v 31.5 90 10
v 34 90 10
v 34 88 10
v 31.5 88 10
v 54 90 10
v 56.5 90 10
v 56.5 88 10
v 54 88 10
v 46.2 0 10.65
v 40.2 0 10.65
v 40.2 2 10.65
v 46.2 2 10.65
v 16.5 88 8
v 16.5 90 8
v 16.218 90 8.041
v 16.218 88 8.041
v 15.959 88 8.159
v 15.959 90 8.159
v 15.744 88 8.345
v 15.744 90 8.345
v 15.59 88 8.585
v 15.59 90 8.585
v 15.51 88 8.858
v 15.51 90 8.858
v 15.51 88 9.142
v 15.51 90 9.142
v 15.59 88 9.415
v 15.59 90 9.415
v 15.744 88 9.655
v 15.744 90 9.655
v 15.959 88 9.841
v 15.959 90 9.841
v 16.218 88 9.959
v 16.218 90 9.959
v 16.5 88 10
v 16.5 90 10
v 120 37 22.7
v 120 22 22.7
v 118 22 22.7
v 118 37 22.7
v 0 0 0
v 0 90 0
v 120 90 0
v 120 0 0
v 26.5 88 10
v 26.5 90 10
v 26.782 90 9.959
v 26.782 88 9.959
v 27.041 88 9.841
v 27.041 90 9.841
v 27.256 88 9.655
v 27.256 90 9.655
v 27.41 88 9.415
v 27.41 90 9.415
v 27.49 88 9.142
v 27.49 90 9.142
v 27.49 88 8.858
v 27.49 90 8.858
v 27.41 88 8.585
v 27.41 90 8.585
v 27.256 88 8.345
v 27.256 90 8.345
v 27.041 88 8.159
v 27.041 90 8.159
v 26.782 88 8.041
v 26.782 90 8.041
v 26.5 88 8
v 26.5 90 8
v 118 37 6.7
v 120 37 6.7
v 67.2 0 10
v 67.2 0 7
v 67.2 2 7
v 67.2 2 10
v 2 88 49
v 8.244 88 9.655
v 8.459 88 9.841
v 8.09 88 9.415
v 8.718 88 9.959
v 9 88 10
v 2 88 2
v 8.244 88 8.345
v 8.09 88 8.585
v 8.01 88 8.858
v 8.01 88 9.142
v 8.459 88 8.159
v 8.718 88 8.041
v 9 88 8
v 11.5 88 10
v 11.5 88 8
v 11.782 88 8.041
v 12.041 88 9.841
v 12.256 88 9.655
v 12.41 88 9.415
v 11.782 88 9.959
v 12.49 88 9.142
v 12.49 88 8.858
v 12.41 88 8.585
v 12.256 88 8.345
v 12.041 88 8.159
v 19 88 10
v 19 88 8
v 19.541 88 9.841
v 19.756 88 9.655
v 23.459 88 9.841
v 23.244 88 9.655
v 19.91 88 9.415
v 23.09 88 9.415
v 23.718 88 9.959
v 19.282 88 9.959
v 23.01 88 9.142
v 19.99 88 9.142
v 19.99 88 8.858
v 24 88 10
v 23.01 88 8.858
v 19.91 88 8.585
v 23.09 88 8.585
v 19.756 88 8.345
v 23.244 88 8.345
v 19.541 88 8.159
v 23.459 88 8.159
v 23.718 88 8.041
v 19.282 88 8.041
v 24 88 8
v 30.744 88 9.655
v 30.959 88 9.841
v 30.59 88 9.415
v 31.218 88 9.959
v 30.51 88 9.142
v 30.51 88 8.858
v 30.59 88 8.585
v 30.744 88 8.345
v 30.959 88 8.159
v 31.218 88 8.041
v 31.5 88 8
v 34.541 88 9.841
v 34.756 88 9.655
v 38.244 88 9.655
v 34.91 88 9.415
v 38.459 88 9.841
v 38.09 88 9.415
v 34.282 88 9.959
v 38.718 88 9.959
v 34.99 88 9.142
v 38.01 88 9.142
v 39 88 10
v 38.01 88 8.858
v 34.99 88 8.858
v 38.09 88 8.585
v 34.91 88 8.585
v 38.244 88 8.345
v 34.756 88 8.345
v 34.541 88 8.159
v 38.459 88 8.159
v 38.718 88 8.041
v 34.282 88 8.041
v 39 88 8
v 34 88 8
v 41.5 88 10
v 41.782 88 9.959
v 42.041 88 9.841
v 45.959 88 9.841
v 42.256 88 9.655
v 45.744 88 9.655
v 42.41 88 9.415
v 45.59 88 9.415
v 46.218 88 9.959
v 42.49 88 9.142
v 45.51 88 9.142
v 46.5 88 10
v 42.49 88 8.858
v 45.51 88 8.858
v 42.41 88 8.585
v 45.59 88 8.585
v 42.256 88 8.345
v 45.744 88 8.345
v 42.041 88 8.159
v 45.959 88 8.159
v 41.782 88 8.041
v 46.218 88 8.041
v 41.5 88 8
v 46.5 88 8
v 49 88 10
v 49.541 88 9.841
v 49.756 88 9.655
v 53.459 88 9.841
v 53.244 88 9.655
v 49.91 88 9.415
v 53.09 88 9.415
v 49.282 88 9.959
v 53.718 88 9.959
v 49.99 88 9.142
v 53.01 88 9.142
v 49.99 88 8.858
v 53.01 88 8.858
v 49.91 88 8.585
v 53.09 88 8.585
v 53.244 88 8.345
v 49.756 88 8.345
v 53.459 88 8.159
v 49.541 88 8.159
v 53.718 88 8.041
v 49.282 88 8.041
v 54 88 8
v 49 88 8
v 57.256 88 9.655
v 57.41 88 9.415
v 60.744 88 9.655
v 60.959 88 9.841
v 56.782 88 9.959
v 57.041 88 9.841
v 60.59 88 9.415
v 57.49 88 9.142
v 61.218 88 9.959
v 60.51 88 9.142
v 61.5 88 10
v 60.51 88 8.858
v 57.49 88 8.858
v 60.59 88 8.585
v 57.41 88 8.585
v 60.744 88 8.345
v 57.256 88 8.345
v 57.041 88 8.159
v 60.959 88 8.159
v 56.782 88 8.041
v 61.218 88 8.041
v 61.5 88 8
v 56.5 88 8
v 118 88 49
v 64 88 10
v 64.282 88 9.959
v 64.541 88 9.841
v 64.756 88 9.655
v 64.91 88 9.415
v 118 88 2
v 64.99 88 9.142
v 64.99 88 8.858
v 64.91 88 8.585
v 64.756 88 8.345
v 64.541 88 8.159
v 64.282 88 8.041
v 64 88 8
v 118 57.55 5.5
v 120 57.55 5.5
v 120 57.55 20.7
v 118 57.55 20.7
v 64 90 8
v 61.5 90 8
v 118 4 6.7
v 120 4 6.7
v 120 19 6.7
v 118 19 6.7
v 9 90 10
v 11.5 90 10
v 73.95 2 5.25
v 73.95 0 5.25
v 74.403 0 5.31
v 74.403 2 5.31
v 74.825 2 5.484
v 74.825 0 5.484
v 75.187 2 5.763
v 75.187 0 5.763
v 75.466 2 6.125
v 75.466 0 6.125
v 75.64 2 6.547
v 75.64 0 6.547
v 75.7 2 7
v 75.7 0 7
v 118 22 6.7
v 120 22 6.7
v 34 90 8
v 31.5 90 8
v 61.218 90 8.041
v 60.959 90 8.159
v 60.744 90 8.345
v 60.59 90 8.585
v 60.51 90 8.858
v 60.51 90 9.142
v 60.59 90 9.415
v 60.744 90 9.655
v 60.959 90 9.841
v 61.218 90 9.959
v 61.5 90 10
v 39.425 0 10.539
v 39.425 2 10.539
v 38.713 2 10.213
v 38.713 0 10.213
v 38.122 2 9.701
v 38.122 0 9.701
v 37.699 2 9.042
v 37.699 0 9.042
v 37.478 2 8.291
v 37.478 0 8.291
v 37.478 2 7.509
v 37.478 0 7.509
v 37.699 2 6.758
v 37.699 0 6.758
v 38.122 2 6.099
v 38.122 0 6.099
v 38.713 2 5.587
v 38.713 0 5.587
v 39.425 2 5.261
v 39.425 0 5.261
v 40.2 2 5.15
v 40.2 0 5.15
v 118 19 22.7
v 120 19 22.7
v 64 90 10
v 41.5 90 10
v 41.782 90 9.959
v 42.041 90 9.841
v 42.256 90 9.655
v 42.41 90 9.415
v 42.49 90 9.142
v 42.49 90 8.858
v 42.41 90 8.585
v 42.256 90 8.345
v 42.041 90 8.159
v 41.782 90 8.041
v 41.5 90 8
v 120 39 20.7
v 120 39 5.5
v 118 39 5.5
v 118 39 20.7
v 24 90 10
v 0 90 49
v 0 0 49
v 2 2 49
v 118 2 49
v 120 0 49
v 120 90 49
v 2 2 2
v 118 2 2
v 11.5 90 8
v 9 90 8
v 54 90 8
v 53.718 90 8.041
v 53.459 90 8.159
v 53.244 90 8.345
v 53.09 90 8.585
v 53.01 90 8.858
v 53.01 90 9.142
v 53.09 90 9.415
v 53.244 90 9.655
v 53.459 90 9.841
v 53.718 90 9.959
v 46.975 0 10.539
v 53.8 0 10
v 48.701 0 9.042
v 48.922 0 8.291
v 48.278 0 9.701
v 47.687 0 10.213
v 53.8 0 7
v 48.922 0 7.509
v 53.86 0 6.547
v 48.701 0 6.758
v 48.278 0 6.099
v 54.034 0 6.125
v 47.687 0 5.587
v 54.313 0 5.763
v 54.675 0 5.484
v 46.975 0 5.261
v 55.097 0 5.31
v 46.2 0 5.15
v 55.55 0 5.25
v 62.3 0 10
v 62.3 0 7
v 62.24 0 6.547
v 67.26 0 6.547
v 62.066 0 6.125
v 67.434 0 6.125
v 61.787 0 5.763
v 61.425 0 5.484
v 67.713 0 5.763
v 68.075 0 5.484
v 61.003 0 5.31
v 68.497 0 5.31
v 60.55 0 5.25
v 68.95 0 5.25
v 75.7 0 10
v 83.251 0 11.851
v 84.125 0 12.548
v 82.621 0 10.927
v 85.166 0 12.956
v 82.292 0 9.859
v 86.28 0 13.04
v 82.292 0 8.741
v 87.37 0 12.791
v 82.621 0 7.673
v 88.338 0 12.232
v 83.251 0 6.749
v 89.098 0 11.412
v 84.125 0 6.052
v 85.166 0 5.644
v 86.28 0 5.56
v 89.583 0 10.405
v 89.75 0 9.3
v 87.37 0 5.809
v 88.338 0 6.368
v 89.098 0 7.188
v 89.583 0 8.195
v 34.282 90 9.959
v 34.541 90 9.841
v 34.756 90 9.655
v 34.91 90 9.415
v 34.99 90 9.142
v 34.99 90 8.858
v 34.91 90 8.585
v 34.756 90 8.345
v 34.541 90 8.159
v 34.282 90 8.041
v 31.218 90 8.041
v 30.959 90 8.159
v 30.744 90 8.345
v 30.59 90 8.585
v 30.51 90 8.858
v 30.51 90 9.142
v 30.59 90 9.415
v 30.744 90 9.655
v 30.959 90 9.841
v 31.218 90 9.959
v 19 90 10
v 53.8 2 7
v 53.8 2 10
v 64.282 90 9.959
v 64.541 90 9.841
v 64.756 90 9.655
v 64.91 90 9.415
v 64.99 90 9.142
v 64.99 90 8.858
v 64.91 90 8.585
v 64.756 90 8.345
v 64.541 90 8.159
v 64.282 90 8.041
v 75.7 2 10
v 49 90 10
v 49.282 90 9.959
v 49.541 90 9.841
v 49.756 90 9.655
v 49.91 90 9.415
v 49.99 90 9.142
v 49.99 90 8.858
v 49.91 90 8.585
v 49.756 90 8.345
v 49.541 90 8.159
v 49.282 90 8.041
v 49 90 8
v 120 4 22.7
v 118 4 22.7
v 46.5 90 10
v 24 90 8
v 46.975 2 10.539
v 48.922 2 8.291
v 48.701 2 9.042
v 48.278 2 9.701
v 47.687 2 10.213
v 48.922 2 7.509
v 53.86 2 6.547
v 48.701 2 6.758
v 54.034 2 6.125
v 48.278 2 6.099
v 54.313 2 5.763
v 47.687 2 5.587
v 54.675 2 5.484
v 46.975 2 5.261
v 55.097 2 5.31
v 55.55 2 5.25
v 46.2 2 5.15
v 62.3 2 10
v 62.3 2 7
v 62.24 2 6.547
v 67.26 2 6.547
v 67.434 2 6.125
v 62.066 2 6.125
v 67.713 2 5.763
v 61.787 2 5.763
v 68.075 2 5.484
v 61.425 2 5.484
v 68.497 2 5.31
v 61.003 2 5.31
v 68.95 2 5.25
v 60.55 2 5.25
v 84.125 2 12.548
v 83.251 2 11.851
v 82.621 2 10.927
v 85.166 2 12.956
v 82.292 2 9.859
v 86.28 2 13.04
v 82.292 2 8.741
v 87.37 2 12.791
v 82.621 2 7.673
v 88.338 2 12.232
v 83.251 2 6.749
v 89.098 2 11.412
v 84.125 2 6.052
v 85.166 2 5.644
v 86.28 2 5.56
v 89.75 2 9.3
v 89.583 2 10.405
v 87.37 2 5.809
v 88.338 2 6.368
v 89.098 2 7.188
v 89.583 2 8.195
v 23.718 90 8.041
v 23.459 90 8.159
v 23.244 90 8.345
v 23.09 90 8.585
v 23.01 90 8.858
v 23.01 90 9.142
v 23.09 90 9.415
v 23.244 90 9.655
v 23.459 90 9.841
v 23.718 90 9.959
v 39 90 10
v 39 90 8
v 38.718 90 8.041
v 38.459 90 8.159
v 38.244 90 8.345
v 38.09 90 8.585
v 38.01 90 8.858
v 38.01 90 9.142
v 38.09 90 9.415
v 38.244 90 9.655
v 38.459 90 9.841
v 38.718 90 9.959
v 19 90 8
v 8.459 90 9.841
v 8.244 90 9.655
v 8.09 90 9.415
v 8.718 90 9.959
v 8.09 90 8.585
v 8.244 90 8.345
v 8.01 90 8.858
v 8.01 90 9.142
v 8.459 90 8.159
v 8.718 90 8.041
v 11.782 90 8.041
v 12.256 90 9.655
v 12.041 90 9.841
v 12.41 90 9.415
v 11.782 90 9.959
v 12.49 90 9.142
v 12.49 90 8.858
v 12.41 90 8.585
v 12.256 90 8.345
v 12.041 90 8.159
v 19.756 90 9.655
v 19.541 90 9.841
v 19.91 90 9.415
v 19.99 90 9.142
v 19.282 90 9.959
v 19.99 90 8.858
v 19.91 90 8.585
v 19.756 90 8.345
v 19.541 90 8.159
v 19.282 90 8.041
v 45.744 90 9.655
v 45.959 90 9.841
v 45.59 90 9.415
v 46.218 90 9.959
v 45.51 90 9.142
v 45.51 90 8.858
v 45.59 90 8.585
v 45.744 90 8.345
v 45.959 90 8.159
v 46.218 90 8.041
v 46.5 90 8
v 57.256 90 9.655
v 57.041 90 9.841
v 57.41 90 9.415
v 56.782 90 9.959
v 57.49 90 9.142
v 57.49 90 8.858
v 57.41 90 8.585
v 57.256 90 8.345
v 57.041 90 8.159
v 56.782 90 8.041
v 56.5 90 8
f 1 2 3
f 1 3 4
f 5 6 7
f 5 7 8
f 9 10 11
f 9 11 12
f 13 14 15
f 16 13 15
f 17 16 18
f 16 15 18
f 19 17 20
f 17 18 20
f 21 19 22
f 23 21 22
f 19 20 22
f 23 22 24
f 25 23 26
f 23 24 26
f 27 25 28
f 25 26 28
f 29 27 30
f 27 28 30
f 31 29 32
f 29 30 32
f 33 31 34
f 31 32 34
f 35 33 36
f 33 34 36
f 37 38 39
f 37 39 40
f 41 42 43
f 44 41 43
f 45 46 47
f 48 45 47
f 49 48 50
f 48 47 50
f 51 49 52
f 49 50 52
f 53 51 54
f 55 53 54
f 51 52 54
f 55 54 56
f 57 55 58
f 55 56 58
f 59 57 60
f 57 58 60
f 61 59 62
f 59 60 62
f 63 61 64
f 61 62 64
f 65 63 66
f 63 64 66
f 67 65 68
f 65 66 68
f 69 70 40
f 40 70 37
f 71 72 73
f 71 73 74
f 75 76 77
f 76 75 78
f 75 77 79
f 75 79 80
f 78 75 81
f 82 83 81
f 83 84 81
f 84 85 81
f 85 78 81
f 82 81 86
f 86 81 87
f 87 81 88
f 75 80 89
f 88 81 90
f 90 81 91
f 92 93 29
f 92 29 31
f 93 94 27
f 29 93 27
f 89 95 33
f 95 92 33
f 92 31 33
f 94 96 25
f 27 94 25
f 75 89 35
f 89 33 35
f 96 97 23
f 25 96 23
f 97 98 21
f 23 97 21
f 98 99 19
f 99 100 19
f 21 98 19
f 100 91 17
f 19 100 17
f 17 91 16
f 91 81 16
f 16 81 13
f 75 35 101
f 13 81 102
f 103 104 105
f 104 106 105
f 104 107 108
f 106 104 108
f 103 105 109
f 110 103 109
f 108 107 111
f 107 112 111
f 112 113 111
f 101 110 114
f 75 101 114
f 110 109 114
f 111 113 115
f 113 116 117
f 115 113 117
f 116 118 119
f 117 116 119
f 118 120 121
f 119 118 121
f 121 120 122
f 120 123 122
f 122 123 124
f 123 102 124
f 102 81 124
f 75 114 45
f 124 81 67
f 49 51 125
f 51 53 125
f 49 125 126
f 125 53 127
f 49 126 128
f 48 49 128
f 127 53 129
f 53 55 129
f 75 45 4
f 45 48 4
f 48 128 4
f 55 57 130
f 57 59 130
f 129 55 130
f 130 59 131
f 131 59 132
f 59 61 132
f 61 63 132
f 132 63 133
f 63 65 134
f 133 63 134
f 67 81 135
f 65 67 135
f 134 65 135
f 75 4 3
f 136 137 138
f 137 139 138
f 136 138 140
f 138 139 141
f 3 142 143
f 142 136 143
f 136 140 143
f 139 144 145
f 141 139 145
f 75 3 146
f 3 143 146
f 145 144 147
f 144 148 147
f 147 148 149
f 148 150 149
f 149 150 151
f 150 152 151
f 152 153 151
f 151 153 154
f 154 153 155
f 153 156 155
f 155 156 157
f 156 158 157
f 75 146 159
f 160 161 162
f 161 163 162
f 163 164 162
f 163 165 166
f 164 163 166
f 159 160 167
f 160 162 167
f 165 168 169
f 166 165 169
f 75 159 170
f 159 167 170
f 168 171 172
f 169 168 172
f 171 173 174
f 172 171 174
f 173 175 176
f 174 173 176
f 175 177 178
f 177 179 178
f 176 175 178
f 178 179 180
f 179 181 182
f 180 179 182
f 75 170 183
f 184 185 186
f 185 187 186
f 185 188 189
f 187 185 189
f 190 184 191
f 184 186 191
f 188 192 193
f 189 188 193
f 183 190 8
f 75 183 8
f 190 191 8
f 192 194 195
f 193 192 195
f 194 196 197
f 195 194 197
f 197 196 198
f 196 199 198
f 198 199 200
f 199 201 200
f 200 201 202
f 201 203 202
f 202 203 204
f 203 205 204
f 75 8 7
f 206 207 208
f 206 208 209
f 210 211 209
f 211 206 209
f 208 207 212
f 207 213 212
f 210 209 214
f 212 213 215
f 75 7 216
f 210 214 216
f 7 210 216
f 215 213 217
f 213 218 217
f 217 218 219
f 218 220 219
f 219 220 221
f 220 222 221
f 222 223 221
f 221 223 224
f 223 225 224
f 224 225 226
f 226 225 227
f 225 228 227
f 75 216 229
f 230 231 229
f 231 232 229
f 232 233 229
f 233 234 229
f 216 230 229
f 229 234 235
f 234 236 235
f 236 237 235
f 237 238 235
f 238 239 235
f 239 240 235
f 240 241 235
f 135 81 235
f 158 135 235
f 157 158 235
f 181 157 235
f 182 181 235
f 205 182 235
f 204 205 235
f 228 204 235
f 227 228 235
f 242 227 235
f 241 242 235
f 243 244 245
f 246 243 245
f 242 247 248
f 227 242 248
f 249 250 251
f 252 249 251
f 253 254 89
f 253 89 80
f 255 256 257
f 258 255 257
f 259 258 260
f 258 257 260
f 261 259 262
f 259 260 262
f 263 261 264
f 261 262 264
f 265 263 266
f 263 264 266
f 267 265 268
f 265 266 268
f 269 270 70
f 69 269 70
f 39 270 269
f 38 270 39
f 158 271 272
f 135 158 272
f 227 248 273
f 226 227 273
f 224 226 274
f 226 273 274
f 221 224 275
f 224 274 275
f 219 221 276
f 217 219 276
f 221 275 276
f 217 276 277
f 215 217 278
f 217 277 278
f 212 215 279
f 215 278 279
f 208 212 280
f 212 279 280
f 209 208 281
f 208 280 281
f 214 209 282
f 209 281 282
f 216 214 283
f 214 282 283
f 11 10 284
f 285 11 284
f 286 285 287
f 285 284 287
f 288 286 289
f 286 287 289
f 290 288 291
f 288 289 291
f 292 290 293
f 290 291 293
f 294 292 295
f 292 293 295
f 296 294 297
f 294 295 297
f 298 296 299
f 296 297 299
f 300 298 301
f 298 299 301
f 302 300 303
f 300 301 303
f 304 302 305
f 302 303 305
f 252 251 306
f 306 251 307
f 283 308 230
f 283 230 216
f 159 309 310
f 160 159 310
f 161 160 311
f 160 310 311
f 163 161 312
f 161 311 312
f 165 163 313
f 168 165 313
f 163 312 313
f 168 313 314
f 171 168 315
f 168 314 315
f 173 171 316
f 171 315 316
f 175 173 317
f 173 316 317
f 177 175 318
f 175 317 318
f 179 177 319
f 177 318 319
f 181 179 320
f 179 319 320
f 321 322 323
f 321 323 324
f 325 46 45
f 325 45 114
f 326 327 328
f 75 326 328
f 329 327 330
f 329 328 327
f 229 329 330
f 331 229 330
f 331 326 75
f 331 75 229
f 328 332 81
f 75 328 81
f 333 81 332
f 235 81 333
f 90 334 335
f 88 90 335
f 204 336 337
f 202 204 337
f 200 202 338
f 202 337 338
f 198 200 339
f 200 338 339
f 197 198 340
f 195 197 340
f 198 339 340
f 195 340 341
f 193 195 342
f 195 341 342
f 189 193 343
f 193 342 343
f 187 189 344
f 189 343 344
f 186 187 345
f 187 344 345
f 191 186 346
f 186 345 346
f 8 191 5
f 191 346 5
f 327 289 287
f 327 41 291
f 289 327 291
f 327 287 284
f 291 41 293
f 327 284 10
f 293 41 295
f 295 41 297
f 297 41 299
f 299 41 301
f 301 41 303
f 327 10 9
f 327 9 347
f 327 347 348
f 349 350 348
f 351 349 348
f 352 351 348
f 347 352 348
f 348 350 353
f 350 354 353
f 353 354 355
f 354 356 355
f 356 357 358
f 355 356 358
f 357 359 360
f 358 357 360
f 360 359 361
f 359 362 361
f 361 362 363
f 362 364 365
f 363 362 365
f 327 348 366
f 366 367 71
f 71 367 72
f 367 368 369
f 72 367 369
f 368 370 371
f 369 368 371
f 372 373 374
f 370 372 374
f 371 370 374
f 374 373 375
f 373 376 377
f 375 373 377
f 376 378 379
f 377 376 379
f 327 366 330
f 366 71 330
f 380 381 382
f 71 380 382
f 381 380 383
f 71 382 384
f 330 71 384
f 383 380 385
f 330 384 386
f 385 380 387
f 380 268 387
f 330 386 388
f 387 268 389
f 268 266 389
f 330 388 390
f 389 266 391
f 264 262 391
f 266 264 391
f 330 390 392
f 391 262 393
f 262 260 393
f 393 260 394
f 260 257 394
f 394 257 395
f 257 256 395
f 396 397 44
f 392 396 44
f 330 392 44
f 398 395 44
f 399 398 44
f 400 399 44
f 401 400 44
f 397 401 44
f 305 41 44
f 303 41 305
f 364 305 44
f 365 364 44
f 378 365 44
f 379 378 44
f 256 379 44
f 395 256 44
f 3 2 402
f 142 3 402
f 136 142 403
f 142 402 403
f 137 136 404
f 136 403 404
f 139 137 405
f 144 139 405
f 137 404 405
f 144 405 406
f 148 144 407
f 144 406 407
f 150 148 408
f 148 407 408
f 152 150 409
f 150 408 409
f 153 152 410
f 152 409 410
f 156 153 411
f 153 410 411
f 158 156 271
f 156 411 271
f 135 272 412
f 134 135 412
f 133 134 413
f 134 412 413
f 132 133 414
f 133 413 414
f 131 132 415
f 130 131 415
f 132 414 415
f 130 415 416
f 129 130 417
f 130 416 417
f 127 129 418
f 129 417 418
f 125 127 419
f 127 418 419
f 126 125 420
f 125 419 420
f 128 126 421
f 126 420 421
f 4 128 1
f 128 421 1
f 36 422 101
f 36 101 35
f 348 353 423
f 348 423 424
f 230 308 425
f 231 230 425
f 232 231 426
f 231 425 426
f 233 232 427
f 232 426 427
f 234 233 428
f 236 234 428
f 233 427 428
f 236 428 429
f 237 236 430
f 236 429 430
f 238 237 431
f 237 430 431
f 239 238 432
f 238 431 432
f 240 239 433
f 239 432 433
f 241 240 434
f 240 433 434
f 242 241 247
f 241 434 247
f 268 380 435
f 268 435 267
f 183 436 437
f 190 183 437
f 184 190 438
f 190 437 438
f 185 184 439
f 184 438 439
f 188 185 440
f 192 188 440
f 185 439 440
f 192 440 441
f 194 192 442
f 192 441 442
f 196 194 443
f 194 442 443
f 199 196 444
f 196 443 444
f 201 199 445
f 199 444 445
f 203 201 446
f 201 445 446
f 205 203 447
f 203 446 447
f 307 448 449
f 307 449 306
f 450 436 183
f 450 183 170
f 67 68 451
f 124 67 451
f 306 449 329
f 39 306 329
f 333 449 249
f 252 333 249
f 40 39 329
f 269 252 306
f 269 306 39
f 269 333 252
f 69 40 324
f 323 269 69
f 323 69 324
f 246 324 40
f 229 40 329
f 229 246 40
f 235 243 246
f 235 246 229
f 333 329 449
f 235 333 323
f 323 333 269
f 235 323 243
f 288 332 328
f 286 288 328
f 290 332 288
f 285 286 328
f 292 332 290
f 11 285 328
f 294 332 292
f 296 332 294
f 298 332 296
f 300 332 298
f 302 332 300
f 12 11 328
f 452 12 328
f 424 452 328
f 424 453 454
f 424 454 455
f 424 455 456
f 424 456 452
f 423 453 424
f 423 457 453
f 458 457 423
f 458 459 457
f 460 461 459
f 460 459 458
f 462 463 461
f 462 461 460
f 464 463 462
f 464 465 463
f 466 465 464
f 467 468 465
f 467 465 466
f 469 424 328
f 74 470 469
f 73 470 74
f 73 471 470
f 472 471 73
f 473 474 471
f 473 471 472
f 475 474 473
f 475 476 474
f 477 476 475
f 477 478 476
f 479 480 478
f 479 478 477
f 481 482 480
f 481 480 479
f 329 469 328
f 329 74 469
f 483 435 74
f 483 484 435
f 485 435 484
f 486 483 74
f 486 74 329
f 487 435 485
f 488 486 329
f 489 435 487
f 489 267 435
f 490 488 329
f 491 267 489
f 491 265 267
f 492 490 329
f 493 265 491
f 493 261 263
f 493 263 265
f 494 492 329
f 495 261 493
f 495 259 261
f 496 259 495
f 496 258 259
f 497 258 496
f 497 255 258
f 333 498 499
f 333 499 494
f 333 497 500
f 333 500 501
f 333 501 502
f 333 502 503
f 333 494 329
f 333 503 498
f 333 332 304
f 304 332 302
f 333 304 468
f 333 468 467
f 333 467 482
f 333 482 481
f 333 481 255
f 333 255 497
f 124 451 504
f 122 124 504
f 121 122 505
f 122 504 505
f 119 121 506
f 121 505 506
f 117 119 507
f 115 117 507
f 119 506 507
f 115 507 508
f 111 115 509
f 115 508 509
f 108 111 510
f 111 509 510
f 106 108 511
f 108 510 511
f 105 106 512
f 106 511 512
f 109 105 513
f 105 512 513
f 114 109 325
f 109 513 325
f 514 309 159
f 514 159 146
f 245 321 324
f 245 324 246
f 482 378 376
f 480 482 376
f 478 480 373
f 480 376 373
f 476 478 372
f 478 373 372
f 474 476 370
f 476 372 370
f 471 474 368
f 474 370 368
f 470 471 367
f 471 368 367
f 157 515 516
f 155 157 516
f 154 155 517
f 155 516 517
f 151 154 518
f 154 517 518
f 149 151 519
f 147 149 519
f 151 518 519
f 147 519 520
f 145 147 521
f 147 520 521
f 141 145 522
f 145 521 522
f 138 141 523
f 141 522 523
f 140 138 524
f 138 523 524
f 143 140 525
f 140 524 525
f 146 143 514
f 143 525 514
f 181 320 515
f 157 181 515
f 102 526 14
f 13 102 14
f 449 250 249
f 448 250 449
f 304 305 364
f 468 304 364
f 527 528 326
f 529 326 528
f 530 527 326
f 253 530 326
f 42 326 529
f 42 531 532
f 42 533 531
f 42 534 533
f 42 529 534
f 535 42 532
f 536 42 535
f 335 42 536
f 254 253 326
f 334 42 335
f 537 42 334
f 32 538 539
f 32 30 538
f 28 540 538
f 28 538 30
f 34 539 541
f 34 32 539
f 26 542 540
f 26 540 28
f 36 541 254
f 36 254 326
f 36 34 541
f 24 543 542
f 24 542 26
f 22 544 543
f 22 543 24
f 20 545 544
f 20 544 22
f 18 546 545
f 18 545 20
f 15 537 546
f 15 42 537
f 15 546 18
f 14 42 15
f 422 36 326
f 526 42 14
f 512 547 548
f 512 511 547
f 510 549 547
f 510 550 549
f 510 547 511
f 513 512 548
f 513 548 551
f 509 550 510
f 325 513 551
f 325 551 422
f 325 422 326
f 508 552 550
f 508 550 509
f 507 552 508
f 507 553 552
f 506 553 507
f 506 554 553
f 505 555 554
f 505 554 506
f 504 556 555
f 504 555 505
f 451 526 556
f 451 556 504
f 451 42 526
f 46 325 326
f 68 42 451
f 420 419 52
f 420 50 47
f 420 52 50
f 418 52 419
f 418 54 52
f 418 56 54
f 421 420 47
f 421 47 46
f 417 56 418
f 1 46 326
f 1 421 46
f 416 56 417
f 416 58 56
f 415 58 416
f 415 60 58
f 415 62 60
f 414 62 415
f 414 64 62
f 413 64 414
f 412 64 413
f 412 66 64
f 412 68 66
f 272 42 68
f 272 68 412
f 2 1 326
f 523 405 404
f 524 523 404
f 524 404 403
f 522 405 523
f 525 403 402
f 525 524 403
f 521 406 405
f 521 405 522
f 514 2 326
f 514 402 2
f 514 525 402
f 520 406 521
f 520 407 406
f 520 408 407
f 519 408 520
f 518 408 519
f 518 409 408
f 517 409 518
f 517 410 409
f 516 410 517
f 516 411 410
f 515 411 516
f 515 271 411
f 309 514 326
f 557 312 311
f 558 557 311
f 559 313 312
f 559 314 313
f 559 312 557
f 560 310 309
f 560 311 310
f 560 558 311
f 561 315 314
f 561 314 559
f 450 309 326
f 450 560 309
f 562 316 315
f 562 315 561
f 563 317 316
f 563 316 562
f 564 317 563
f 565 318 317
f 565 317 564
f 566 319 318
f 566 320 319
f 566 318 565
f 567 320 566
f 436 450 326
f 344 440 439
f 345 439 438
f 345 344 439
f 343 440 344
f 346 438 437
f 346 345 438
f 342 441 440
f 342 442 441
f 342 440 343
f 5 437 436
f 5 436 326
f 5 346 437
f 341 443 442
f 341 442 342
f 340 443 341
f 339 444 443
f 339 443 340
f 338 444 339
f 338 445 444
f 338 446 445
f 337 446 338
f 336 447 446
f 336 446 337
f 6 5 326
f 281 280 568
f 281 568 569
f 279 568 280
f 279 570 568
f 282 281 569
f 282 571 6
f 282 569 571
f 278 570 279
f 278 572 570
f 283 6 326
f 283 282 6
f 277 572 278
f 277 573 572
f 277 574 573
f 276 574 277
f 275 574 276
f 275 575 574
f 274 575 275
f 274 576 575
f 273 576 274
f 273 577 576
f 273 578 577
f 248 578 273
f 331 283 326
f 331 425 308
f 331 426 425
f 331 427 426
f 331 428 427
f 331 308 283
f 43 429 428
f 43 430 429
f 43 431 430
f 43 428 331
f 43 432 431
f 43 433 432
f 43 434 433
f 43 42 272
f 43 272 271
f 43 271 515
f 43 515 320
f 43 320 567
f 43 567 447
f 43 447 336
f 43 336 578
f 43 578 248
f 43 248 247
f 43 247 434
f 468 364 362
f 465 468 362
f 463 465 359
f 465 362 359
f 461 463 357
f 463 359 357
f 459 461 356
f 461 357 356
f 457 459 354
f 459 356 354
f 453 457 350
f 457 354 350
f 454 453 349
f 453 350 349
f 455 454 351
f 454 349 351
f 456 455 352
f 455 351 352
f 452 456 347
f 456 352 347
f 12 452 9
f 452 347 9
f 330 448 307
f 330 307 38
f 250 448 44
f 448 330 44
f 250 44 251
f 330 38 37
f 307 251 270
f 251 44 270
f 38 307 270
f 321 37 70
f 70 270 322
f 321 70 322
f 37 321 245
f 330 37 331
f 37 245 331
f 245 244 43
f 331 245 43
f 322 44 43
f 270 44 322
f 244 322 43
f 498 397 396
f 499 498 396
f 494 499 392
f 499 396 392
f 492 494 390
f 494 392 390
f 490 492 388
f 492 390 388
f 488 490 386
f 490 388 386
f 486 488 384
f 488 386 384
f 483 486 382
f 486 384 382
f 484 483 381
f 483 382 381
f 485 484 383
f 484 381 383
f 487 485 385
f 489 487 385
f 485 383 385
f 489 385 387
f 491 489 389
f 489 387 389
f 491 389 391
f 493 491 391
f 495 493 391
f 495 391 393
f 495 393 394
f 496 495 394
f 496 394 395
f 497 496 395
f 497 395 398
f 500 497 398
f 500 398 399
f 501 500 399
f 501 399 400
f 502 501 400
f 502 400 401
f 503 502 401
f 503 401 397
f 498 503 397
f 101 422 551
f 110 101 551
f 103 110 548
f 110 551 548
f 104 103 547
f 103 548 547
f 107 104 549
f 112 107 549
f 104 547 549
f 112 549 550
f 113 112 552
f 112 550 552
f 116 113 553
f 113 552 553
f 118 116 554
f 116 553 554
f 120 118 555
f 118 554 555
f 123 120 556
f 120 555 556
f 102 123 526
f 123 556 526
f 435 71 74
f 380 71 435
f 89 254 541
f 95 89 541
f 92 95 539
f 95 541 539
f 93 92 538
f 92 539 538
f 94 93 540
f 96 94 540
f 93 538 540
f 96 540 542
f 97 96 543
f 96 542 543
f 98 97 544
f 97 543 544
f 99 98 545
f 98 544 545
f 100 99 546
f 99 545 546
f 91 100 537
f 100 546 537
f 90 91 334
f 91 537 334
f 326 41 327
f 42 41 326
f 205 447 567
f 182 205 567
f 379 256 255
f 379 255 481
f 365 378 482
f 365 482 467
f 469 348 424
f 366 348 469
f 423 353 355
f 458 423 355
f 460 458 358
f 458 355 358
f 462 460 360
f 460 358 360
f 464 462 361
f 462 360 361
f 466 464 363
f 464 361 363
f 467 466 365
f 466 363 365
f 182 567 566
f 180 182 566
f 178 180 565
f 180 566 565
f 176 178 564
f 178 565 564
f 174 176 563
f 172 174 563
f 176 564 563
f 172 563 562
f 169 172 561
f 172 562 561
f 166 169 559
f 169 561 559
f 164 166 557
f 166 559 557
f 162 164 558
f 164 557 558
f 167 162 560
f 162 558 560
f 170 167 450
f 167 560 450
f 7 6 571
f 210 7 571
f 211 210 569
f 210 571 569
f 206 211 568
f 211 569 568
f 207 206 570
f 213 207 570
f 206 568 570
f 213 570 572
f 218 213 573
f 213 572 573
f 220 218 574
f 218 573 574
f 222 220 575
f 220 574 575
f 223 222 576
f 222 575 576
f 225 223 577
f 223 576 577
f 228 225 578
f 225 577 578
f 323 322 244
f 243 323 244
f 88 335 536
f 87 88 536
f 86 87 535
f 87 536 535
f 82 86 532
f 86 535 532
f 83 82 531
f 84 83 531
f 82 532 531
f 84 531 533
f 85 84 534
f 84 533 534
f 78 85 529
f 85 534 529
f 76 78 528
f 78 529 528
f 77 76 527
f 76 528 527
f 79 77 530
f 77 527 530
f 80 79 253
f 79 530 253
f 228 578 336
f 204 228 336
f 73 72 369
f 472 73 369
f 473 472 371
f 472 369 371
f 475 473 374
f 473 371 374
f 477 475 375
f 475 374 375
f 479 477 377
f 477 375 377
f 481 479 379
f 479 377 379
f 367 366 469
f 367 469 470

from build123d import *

# Parameters (mm, degrees)
SKETCH001_W     = 120
SKETCH001_H     = 90
PAD_DEPTH       = 2
SKETCH_W        = 120
SKETCH_H        = 90
SKETCH_W_2      = 116
SKETCH_H_2      = 86
PAD001_DEPTH    = 47
SKETCH002_W     = 15
SKETCH002_H     = 16
SKETCH002_W_2   = 18.55
SKETCH002_H_2   = 15.2
POCKET_DEPTH    = 5
SKETCH003_R     = 3.75
POCKET001_DEPTH = 5
POCKET002_DEPTH = 5


with BuildPart() as part:
    # Sketch001 → Pad (new body)
    with BuildSketch(Plane.XY):
        with Locations((60, 45)):
            Rectangle(SKETCH001_W, SKETCH001_H)
    extrude(amount=PAD_DEPTH)

    # Sketch (on Face6 of Pad) → Pad001 (join)
    with BuildSketch(Plane.XY.offset(2)):
        with Locations((60, 45)):
            Rectangle(SKETCH_W, SKETCH_H)
        with Locations((60, 45)):
            Rectangle(SKETCH_W_2, SKETCH_H_2, mode=Mode.SUBTRACT)
    extrude(amount=PAD001_DEPTH)

    # Sketch002 (on Face8 of Pad001) → Pocket (cut)
    with BuildSketch(Plane.YZ.offset(120)):
        with Locations((11.5, 14.7)):
            Rectangle(SKETCH002_W, SKETCH002_H)
        with Locations((29.5, 14.7)):
            Rectangle(SKETCH002_W, SKETCH002_H)
        with Locations((48.275, 13.1)):
            Rectangle(SKETCH002_W_2, SKETCH002_H_2)
    extrude(amount=-POCKET_DEPTH, mode=Mode.SUBTRACT)

    # Sketch003 (on Face5 of Pocket) → Pocket001 (cut)
    with BuildSketch(Plane.XZ):
        with Locations((86, 9.3)):
            Circle(SKETCH003_R)
        with BuildLine():
            ThreePointArc((40.2, 10.65), (37.45, 7.9), (40.2, 5.15))
            Line((40.2, 5.15), (46.2, 5.15))
            ThreePointArc((46.2, 5.15), (48.95, 7.9), (46.2, 10.65))
            Line((40.2, 10.65), (46.2, 10.65))
        make_face()
        with BuildLine():
            Line((53.8, 10), (62.3, 10))
            Line((62.3, 10), (62.3, 7))
            ThreePointArc((60.55, 5.25), (61.787437, 5.762563), (62.3, 7))
            Line((60.55, 5.25), (55.55, 5.25))
            ThreePointArc((53.8, 7), (54.312563, 5.762563), (55.55, 5.25))
            Line((53.8, 7), (53.8, 10))
        make_face()
        with BuildLine():
            Line((67.2, 10), (75.7, 10))
            Line((75.7, 10), (75.7, 7))
            ThreePointArc((73.95, 5.25), (75.187437, 5.762563), (75.7, 7))
            Line((73.95, 5.25), (68.95, 5.25))
            ThreePointArc((67.2, 7), (67.712563, 5.762563), (68.95, 5.25))
            Line((67.2, 7), (67.2, 10))
        make_face()
    extrude(amount=-POCKET001_DEPTH, mode=Mode.SUBTRACT)

    # Sketch007 (on Face27 of Pocket001) → Pocket002 (cut)
    with BuildSketch(Plane(origin=(0, 90, 0), x_dir=(-1, 0, 0), z_dir=(0, 1, 0))):
        with BuildLine():
            ThreePointArc((-64, 10), (-65, 9), (-64, 8))
            Line((-64, 8), (-61.5, 8))
            ThreePointArc((-61.5, 8), (-60.5, 9), (-61.5, 10))
            Line((-64, 10), (-61.5, 10))
        make_face()
        with BuildLine():
            ThreePointArc((-56.5, 10), (-57.5, 9), (-56.5, 8))
            Line((-56.5, 8), (-54, 8))
            ThreePointArc((-54, 8), (-53, 9), (-54, 10))
            Line((-56.5, 10), (-54, 10))
        make_face()
        with BuildLine():
            ThreePointArc((-49, 10), (-50, 9), (-49, 8))
            Line((-49, 8), (-46.5, 8))
            ThreePointArc((-46.5, 8), (-45.5, 9), (-46.5, 10))
            Line((-49, 10), (-46.5, 10))
        make_face()
        with BuildLine():
            ThreePointArc((-41.5, 10), (-42.5, 9), (-41.5, 8))
            Line((-41.5, 8), (-39, 8))
            ThreePointArc((-39, 8), (-38, 9), (-39, 10))
            Line((-41.5, 10), (-39, 10))
        make_face()
        with BuildLine():
            ThreePointArc((-34, 10), (-35, 9), (-34, 8))
            Line((-34, 8), (-31.5, 8))
            ThreePointArc((-31.5, 8), (-30.5, 9), (-31.5, 10))
            Line((-34, 10), (-31.5, 10))
        make_face()
        with BuildLine():
            ThreePointArc((-26.5, 10), (-27.5, 9), (-26.5, 8))
            Line((-26.5, 8), (-24, 8))
            ThreePointArc((-24, 8), (-23, 9), (-24, 10))
            Line((-26.5, 10), (-24, 10))
        make_face()
        with BuildLine():
            ThreePointArc((-19, 10), (-20, 9), (-19, 8))
            Line((-19, 8), (-16.5, 8))
            ThreePointArc((-16.5, 8), (-15.5, 9), (-16.5, 10))
            Line((-19, 10), (-16.5, 10))
        make_face()
        with BuildLine():
            ThreePointArc((-11.5, 10), (-12.5, 9), (-11.5, 8))
            Line((-11.5, 8), (-9, 8))
            ThreePointArc((-9, 8), (-8, 9), (-9, 10))
            Line((-11.5, 10), (-9, 10))
        make_face()
    extrude(amount=-POCKET002_DEPTH, mode=Mode.SUBTRACT)


solid = part.part
